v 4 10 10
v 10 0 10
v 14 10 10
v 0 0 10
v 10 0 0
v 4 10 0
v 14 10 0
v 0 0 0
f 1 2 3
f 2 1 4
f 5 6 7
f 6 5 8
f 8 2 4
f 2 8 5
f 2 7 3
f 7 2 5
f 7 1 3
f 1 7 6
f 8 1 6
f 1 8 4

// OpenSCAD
// multmatrix: a shear + a scale applied to a box.
multmatrix([[1, 0.4, 0, 0],
            [0, 1,   0, 0],
            [0, 0,   2, 0],
            [0, 0,   0, 1]])
cube([10, 10, 5]);
